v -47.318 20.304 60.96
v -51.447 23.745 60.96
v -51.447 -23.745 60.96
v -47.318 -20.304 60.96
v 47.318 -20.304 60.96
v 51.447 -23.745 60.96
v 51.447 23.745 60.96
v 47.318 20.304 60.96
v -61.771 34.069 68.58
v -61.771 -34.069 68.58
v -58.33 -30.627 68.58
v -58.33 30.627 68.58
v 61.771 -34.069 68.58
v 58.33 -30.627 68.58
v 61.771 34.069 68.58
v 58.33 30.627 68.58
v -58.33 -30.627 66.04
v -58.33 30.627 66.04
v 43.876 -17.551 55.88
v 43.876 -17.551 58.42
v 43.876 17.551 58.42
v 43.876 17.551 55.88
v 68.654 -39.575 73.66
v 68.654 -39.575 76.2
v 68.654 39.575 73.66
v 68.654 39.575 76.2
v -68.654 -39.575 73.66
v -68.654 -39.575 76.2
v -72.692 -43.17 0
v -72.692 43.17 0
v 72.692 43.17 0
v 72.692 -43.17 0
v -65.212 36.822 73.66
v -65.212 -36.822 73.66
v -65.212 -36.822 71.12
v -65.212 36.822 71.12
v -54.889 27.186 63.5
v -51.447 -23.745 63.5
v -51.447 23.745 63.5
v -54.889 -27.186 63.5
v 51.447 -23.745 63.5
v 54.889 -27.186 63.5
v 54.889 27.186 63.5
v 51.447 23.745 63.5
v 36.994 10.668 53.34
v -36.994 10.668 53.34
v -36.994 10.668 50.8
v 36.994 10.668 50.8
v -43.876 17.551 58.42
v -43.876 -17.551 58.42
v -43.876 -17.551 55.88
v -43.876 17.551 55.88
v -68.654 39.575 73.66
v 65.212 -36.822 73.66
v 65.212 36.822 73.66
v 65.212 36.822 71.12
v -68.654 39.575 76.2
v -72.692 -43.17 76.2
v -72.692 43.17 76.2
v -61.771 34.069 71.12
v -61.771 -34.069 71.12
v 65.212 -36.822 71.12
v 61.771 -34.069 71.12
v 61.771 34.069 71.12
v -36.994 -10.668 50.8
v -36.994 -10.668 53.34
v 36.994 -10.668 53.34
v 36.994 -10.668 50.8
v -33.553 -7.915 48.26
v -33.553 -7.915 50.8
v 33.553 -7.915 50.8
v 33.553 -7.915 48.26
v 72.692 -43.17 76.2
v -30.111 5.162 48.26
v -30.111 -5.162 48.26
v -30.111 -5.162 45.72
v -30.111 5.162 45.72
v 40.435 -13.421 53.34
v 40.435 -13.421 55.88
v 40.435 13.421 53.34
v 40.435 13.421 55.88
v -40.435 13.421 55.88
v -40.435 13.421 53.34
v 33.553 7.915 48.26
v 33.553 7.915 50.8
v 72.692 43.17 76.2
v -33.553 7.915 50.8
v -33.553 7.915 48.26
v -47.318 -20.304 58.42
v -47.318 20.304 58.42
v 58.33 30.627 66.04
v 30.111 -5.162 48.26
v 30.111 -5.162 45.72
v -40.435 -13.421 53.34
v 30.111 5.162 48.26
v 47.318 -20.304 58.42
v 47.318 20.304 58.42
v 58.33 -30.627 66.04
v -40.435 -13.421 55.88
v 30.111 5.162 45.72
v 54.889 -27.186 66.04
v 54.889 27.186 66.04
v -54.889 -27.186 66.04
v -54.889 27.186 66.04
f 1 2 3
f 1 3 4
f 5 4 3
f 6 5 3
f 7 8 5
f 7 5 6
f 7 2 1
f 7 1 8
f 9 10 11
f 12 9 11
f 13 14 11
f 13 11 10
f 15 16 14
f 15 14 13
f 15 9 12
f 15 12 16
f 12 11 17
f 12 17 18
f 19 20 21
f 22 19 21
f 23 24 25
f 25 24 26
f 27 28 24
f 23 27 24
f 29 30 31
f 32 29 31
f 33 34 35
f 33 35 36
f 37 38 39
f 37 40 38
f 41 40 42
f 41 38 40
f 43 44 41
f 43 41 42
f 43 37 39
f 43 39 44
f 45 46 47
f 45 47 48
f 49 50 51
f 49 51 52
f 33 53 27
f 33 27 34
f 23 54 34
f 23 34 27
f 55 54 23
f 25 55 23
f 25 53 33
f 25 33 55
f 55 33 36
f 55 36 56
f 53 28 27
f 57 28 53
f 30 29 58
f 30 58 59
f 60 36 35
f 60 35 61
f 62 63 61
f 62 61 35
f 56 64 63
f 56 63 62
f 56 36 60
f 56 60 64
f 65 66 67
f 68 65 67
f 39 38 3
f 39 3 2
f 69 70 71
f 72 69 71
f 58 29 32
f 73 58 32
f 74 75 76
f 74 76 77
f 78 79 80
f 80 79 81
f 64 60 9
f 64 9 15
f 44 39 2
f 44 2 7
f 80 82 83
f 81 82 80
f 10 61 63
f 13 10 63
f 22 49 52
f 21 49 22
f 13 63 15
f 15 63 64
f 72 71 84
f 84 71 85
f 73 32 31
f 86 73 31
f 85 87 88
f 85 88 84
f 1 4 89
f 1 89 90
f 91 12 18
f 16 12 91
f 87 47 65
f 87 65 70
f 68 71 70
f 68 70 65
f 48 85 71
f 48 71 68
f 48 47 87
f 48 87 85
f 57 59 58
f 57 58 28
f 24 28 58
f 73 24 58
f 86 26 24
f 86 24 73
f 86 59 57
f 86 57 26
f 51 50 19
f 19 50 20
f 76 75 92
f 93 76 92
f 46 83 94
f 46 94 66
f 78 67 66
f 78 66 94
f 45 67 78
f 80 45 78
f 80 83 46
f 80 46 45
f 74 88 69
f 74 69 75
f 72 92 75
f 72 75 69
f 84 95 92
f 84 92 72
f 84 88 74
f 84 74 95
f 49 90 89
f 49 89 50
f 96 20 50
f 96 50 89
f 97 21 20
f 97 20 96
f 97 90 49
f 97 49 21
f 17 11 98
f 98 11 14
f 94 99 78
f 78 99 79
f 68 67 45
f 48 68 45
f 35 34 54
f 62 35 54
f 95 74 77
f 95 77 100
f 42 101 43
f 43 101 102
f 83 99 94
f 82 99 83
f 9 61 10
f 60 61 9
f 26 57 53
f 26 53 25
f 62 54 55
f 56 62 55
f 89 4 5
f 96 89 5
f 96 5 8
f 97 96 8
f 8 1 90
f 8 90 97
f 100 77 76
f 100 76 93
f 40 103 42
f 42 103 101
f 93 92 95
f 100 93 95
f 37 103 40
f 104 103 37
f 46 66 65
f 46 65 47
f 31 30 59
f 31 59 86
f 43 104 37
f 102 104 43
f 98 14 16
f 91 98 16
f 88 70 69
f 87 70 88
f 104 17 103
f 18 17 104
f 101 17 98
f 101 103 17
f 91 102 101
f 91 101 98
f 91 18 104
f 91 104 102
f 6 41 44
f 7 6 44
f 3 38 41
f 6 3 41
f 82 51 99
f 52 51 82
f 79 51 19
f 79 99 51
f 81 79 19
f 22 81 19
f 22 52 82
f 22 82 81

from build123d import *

# Parameters (mm, degrees)
F0_W      = 145.384446
F0_H      = 86.339206
F1_DEPTH  = 76.2
F2_W      = 137.30748
F2_H      = 79.149678
F3_DEPTH  = 2.54
F4_W      = 130.424902
F4_H      = 73.643618
F5_DEPTH  = 2.54
F6_W      = 123.542332
F6_H      = 68.137548
F7_DEPTH  = 2.54
F8_W      = 116.65973
F8_H      = 61.254968
F9_DEPTH  = 2.54
F10_W     = 109.77716
F10_H     = 54.372388
F11_DEPTH = 2.54
F12_W     = 102.894582
F12_H     = 47.489804
F13_DEPTH = 2.54
F14_W     = 94.635486
F14_H     = 40.607226
F15_DEPTH = 2.54
F16_W     = 87.752902
F16_H     = 35.10116
F17_DEPTH = 2.54
F18_W     = 80.870316
F18_H     = 26.842066
F19_DEPTH = 2.54
F20_W     = 73.987744
F20_H     = 21.336002
F21_DEPTH = 2.54
F22_W     = 67.105166
F22_H     = 15.829936
F23_DEPTH = 2.54
F24_W     = 60.222582
F24_H     = 10.32387
F25_DEPTH = 2.54


with BuildPart() as f1:
    # F0 (on Top) → F1 (new body)
    with BuildSketch(Plane.XY):
        Rectangle(F0_W, F0_H)
    extrude(amount=F1_DEPTH)

    # F2 (on face) → F3 (cut)
    with BuildSketch(Plane.XY.offset(76.2)):
        Rectangle(F2_W, F2_H)
    extrude(amount=-F3_DEPTH, mode=Mode.SUBTRACT)

    # F4 (on face) → F5 (cut)
    with BuildSketch(Plane.XY.offset(73.66)):
        Rectangle(F4_W, F4_H)
    extrude(amount=-F5_DEPTH, mode=Mode.SUBTRACT)

    # F6 (on face) → F7 (cut)
    with BuildSketch(Plane.XY.offset(71.12)):
        Rectangle(F6_W, F6_H)
    extrude(amount=-F7_DEPTH, mode=Mode.SUBTRACT)

    # F8 (on face) → F9 (cut)
    with BuildSketch(Plane.XY.offset(68.58)):
        Rectangle(F8_W, F8_H)
    extrude(amount=-F9_DEPTH, mode=Mode.SUBTRACT)

    # F10 (on face) → F11 (cut)
    with BuildSketch(Plane.XY.offset(66.04)):
        Rectangle(F10_W, F10_H)
    extrude(amount=-F11_DEPTH, mode=Mode.SUBTRACT)

    # F12 (on face) → F13 (cut)
    with BuildSketch(Plane.XY.offset(63.5)):
        Rectangle(F12_W, F12_H)
    extrude(amount=-F13_DEPTH, mode=Mode.SUBTRACT)

    # F14 (on face) → F15 (cut)
    with BuildSketch(Plane.XY.offset(60.96)):
        Rectangle(F14_W, F14_H)
    extrude(amount=-F15_DEPTH, mode=Mode.SUBTRACT)

    # F16 (on face) → F17 (cut)
    with BuildSketch(Plane.XY.offset(58.42)):
        Rectangle(F16_W, F16_H)
    extrude(amount=-F17_DEPTH, mode=Mode.SUBTRACT)

    # F18 (on face) → F19 (cut)
    with BuildSketch(Plane.XY.offset(55.88)):
        Rectangle(F18_W, F18_H)
    extrude(amount=-F19_DEPTH, mode=Mode.SUBTRACT)

    # F20 (on face) → F21 (cut)
    with BuildSketch(Plane.XY.offset(53.34)):
        Rectangle(F20_W, F20_H)
    extrude(amount=-F21_DEPTH, mode=Mode.SUBTRACT)

    # F22 (on face) → F23 (cut)
    with BuildSketch(Plane.XY.offset(50.8)):
        Rectangle(F22_W, F22_H)
    extrude(amount=-F23_DEPTH, mode=Mode.SUBTRACT)

    # F24 (on face) → F25 (cut)
    with BuildSketch(Plane.XY.offset(48.26)):
        Rectangle(F24_W, F24_H)
    extrude(amount=-F25_DEPTH, mode=Mode.SUBTRACT)


solid = f1.part
